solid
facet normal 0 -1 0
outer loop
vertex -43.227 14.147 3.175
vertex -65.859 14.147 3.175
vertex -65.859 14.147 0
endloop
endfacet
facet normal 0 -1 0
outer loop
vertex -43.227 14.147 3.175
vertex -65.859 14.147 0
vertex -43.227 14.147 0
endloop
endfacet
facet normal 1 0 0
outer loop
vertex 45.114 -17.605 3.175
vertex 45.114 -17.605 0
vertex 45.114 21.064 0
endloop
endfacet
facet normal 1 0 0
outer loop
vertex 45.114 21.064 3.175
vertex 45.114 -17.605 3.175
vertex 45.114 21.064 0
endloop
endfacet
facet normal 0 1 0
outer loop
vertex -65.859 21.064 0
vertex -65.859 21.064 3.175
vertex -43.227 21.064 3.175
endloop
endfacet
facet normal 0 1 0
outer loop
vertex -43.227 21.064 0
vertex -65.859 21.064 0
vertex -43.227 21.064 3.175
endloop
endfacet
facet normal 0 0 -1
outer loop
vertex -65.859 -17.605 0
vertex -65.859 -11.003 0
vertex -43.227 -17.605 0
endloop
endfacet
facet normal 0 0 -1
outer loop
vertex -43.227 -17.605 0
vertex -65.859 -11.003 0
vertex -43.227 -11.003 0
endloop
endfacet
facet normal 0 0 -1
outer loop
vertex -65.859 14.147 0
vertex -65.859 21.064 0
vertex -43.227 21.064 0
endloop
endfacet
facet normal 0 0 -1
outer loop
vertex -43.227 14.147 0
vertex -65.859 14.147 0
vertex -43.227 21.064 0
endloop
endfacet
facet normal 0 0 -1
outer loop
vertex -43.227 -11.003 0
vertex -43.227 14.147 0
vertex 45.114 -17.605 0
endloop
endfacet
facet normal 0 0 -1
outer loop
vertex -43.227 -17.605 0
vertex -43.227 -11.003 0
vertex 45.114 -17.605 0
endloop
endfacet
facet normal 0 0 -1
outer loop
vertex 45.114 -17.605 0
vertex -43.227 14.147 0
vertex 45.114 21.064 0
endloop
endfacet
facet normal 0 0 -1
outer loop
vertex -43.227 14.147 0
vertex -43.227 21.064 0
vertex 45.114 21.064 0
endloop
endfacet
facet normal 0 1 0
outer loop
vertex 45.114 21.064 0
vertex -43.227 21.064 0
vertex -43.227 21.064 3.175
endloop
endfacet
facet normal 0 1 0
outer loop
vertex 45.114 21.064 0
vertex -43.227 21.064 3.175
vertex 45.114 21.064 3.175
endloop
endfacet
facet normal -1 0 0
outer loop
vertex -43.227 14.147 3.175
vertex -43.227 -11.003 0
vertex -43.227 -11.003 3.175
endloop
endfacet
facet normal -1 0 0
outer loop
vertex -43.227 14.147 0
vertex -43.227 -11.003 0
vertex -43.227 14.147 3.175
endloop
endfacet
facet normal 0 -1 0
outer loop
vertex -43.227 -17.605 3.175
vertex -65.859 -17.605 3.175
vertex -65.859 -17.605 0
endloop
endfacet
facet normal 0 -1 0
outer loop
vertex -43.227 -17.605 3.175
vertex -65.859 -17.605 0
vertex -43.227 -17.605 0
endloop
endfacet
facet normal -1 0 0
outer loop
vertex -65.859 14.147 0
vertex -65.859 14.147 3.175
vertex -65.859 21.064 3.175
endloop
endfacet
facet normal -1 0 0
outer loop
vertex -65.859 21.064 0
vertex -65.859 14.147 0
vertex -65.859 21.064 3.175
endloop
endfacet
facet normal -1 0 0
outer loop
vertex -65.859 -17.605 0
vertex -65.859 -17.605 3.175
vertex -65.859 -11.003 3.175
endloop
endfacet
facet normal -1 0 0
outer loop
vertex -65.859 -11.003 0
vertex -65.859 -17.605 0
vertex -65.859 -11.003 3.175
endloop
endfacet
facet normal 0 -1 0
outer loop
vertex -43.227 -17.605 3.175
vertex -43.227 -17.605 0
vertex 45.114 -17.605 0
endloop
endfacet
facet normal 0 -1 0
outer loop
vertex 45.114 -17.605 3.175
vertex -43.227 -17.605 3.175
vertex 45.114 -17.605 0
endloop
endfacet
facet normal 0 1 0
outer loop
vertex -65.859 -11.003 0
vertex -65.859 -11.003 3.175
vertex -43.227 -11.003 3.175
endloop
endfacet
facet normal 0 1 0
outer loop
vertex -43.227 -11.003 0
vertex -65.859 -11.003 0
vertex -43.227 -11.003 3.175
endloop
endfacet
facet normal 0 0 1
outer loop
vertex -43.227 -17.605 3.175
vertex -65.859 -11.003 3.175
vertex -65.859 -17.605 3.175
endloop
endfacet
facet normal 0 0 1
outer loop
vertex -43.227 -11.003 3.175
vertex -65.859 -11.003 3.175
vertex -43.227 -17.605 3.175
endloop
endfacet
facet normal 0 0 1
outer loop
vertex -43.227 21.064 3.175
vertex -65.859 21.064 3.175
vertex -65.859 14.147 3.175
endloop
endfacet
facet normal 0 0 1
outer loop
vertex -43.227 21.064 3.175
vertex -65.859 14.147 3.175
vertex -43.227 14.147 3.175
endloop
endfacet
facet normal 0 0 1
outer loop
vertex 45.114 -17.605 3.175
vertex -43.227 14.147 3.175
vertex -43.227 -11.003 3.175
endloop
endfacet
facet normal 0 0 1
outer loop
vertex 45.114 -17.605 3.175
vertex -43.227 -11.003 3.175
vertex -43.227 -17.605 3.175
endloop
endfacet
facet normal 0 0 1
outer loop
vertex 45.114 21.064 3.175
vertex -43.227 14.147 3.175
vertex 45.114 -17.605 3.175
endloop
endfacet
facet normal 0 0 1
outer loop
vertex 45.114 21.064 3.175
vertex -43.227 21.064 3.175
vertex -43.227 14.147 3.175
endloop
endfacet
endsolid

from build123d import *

# Parameters (mm, degrees)
F0_W     = 88.341098
F0_H     = 38.66888
F1_DEPTH = 3.175
F2_W     = 22.6314
F2_H     = 6.916385
F3_DEPTH = 3.175
F4_W     = 22.6314
F4_H     = 6.602003
F5_DEPTH = 3.175


with BuildPart() as f1:
    # F0 (on Top) → F1 (new body)
    with BuildSketch(Plane.XY):
        with Locations((0.943141, 1.729096)):
            Rectangle(F0_W, F0_H)
    extrude(amount=F1_DEPTH)

    # F2 (on face) → F3 (join)
    with BuildSketch(Plane.XY.offset(3.175)):
        with Locations((-54.543108, 17.605344)):
            Rectangle(F2_W, F2_H)
    extrude(amount=-F3_DEPTH)

    # F4 (on face) → F5 (join)
    with BuildSketch(Plane.XY.offset(3.175)):
        with Locations((-54.543108, -14.304342)):
            Rectangle(F4_W, F4_H)
    extrude(amount=-F5_DEPTH)


solid = f1.part
